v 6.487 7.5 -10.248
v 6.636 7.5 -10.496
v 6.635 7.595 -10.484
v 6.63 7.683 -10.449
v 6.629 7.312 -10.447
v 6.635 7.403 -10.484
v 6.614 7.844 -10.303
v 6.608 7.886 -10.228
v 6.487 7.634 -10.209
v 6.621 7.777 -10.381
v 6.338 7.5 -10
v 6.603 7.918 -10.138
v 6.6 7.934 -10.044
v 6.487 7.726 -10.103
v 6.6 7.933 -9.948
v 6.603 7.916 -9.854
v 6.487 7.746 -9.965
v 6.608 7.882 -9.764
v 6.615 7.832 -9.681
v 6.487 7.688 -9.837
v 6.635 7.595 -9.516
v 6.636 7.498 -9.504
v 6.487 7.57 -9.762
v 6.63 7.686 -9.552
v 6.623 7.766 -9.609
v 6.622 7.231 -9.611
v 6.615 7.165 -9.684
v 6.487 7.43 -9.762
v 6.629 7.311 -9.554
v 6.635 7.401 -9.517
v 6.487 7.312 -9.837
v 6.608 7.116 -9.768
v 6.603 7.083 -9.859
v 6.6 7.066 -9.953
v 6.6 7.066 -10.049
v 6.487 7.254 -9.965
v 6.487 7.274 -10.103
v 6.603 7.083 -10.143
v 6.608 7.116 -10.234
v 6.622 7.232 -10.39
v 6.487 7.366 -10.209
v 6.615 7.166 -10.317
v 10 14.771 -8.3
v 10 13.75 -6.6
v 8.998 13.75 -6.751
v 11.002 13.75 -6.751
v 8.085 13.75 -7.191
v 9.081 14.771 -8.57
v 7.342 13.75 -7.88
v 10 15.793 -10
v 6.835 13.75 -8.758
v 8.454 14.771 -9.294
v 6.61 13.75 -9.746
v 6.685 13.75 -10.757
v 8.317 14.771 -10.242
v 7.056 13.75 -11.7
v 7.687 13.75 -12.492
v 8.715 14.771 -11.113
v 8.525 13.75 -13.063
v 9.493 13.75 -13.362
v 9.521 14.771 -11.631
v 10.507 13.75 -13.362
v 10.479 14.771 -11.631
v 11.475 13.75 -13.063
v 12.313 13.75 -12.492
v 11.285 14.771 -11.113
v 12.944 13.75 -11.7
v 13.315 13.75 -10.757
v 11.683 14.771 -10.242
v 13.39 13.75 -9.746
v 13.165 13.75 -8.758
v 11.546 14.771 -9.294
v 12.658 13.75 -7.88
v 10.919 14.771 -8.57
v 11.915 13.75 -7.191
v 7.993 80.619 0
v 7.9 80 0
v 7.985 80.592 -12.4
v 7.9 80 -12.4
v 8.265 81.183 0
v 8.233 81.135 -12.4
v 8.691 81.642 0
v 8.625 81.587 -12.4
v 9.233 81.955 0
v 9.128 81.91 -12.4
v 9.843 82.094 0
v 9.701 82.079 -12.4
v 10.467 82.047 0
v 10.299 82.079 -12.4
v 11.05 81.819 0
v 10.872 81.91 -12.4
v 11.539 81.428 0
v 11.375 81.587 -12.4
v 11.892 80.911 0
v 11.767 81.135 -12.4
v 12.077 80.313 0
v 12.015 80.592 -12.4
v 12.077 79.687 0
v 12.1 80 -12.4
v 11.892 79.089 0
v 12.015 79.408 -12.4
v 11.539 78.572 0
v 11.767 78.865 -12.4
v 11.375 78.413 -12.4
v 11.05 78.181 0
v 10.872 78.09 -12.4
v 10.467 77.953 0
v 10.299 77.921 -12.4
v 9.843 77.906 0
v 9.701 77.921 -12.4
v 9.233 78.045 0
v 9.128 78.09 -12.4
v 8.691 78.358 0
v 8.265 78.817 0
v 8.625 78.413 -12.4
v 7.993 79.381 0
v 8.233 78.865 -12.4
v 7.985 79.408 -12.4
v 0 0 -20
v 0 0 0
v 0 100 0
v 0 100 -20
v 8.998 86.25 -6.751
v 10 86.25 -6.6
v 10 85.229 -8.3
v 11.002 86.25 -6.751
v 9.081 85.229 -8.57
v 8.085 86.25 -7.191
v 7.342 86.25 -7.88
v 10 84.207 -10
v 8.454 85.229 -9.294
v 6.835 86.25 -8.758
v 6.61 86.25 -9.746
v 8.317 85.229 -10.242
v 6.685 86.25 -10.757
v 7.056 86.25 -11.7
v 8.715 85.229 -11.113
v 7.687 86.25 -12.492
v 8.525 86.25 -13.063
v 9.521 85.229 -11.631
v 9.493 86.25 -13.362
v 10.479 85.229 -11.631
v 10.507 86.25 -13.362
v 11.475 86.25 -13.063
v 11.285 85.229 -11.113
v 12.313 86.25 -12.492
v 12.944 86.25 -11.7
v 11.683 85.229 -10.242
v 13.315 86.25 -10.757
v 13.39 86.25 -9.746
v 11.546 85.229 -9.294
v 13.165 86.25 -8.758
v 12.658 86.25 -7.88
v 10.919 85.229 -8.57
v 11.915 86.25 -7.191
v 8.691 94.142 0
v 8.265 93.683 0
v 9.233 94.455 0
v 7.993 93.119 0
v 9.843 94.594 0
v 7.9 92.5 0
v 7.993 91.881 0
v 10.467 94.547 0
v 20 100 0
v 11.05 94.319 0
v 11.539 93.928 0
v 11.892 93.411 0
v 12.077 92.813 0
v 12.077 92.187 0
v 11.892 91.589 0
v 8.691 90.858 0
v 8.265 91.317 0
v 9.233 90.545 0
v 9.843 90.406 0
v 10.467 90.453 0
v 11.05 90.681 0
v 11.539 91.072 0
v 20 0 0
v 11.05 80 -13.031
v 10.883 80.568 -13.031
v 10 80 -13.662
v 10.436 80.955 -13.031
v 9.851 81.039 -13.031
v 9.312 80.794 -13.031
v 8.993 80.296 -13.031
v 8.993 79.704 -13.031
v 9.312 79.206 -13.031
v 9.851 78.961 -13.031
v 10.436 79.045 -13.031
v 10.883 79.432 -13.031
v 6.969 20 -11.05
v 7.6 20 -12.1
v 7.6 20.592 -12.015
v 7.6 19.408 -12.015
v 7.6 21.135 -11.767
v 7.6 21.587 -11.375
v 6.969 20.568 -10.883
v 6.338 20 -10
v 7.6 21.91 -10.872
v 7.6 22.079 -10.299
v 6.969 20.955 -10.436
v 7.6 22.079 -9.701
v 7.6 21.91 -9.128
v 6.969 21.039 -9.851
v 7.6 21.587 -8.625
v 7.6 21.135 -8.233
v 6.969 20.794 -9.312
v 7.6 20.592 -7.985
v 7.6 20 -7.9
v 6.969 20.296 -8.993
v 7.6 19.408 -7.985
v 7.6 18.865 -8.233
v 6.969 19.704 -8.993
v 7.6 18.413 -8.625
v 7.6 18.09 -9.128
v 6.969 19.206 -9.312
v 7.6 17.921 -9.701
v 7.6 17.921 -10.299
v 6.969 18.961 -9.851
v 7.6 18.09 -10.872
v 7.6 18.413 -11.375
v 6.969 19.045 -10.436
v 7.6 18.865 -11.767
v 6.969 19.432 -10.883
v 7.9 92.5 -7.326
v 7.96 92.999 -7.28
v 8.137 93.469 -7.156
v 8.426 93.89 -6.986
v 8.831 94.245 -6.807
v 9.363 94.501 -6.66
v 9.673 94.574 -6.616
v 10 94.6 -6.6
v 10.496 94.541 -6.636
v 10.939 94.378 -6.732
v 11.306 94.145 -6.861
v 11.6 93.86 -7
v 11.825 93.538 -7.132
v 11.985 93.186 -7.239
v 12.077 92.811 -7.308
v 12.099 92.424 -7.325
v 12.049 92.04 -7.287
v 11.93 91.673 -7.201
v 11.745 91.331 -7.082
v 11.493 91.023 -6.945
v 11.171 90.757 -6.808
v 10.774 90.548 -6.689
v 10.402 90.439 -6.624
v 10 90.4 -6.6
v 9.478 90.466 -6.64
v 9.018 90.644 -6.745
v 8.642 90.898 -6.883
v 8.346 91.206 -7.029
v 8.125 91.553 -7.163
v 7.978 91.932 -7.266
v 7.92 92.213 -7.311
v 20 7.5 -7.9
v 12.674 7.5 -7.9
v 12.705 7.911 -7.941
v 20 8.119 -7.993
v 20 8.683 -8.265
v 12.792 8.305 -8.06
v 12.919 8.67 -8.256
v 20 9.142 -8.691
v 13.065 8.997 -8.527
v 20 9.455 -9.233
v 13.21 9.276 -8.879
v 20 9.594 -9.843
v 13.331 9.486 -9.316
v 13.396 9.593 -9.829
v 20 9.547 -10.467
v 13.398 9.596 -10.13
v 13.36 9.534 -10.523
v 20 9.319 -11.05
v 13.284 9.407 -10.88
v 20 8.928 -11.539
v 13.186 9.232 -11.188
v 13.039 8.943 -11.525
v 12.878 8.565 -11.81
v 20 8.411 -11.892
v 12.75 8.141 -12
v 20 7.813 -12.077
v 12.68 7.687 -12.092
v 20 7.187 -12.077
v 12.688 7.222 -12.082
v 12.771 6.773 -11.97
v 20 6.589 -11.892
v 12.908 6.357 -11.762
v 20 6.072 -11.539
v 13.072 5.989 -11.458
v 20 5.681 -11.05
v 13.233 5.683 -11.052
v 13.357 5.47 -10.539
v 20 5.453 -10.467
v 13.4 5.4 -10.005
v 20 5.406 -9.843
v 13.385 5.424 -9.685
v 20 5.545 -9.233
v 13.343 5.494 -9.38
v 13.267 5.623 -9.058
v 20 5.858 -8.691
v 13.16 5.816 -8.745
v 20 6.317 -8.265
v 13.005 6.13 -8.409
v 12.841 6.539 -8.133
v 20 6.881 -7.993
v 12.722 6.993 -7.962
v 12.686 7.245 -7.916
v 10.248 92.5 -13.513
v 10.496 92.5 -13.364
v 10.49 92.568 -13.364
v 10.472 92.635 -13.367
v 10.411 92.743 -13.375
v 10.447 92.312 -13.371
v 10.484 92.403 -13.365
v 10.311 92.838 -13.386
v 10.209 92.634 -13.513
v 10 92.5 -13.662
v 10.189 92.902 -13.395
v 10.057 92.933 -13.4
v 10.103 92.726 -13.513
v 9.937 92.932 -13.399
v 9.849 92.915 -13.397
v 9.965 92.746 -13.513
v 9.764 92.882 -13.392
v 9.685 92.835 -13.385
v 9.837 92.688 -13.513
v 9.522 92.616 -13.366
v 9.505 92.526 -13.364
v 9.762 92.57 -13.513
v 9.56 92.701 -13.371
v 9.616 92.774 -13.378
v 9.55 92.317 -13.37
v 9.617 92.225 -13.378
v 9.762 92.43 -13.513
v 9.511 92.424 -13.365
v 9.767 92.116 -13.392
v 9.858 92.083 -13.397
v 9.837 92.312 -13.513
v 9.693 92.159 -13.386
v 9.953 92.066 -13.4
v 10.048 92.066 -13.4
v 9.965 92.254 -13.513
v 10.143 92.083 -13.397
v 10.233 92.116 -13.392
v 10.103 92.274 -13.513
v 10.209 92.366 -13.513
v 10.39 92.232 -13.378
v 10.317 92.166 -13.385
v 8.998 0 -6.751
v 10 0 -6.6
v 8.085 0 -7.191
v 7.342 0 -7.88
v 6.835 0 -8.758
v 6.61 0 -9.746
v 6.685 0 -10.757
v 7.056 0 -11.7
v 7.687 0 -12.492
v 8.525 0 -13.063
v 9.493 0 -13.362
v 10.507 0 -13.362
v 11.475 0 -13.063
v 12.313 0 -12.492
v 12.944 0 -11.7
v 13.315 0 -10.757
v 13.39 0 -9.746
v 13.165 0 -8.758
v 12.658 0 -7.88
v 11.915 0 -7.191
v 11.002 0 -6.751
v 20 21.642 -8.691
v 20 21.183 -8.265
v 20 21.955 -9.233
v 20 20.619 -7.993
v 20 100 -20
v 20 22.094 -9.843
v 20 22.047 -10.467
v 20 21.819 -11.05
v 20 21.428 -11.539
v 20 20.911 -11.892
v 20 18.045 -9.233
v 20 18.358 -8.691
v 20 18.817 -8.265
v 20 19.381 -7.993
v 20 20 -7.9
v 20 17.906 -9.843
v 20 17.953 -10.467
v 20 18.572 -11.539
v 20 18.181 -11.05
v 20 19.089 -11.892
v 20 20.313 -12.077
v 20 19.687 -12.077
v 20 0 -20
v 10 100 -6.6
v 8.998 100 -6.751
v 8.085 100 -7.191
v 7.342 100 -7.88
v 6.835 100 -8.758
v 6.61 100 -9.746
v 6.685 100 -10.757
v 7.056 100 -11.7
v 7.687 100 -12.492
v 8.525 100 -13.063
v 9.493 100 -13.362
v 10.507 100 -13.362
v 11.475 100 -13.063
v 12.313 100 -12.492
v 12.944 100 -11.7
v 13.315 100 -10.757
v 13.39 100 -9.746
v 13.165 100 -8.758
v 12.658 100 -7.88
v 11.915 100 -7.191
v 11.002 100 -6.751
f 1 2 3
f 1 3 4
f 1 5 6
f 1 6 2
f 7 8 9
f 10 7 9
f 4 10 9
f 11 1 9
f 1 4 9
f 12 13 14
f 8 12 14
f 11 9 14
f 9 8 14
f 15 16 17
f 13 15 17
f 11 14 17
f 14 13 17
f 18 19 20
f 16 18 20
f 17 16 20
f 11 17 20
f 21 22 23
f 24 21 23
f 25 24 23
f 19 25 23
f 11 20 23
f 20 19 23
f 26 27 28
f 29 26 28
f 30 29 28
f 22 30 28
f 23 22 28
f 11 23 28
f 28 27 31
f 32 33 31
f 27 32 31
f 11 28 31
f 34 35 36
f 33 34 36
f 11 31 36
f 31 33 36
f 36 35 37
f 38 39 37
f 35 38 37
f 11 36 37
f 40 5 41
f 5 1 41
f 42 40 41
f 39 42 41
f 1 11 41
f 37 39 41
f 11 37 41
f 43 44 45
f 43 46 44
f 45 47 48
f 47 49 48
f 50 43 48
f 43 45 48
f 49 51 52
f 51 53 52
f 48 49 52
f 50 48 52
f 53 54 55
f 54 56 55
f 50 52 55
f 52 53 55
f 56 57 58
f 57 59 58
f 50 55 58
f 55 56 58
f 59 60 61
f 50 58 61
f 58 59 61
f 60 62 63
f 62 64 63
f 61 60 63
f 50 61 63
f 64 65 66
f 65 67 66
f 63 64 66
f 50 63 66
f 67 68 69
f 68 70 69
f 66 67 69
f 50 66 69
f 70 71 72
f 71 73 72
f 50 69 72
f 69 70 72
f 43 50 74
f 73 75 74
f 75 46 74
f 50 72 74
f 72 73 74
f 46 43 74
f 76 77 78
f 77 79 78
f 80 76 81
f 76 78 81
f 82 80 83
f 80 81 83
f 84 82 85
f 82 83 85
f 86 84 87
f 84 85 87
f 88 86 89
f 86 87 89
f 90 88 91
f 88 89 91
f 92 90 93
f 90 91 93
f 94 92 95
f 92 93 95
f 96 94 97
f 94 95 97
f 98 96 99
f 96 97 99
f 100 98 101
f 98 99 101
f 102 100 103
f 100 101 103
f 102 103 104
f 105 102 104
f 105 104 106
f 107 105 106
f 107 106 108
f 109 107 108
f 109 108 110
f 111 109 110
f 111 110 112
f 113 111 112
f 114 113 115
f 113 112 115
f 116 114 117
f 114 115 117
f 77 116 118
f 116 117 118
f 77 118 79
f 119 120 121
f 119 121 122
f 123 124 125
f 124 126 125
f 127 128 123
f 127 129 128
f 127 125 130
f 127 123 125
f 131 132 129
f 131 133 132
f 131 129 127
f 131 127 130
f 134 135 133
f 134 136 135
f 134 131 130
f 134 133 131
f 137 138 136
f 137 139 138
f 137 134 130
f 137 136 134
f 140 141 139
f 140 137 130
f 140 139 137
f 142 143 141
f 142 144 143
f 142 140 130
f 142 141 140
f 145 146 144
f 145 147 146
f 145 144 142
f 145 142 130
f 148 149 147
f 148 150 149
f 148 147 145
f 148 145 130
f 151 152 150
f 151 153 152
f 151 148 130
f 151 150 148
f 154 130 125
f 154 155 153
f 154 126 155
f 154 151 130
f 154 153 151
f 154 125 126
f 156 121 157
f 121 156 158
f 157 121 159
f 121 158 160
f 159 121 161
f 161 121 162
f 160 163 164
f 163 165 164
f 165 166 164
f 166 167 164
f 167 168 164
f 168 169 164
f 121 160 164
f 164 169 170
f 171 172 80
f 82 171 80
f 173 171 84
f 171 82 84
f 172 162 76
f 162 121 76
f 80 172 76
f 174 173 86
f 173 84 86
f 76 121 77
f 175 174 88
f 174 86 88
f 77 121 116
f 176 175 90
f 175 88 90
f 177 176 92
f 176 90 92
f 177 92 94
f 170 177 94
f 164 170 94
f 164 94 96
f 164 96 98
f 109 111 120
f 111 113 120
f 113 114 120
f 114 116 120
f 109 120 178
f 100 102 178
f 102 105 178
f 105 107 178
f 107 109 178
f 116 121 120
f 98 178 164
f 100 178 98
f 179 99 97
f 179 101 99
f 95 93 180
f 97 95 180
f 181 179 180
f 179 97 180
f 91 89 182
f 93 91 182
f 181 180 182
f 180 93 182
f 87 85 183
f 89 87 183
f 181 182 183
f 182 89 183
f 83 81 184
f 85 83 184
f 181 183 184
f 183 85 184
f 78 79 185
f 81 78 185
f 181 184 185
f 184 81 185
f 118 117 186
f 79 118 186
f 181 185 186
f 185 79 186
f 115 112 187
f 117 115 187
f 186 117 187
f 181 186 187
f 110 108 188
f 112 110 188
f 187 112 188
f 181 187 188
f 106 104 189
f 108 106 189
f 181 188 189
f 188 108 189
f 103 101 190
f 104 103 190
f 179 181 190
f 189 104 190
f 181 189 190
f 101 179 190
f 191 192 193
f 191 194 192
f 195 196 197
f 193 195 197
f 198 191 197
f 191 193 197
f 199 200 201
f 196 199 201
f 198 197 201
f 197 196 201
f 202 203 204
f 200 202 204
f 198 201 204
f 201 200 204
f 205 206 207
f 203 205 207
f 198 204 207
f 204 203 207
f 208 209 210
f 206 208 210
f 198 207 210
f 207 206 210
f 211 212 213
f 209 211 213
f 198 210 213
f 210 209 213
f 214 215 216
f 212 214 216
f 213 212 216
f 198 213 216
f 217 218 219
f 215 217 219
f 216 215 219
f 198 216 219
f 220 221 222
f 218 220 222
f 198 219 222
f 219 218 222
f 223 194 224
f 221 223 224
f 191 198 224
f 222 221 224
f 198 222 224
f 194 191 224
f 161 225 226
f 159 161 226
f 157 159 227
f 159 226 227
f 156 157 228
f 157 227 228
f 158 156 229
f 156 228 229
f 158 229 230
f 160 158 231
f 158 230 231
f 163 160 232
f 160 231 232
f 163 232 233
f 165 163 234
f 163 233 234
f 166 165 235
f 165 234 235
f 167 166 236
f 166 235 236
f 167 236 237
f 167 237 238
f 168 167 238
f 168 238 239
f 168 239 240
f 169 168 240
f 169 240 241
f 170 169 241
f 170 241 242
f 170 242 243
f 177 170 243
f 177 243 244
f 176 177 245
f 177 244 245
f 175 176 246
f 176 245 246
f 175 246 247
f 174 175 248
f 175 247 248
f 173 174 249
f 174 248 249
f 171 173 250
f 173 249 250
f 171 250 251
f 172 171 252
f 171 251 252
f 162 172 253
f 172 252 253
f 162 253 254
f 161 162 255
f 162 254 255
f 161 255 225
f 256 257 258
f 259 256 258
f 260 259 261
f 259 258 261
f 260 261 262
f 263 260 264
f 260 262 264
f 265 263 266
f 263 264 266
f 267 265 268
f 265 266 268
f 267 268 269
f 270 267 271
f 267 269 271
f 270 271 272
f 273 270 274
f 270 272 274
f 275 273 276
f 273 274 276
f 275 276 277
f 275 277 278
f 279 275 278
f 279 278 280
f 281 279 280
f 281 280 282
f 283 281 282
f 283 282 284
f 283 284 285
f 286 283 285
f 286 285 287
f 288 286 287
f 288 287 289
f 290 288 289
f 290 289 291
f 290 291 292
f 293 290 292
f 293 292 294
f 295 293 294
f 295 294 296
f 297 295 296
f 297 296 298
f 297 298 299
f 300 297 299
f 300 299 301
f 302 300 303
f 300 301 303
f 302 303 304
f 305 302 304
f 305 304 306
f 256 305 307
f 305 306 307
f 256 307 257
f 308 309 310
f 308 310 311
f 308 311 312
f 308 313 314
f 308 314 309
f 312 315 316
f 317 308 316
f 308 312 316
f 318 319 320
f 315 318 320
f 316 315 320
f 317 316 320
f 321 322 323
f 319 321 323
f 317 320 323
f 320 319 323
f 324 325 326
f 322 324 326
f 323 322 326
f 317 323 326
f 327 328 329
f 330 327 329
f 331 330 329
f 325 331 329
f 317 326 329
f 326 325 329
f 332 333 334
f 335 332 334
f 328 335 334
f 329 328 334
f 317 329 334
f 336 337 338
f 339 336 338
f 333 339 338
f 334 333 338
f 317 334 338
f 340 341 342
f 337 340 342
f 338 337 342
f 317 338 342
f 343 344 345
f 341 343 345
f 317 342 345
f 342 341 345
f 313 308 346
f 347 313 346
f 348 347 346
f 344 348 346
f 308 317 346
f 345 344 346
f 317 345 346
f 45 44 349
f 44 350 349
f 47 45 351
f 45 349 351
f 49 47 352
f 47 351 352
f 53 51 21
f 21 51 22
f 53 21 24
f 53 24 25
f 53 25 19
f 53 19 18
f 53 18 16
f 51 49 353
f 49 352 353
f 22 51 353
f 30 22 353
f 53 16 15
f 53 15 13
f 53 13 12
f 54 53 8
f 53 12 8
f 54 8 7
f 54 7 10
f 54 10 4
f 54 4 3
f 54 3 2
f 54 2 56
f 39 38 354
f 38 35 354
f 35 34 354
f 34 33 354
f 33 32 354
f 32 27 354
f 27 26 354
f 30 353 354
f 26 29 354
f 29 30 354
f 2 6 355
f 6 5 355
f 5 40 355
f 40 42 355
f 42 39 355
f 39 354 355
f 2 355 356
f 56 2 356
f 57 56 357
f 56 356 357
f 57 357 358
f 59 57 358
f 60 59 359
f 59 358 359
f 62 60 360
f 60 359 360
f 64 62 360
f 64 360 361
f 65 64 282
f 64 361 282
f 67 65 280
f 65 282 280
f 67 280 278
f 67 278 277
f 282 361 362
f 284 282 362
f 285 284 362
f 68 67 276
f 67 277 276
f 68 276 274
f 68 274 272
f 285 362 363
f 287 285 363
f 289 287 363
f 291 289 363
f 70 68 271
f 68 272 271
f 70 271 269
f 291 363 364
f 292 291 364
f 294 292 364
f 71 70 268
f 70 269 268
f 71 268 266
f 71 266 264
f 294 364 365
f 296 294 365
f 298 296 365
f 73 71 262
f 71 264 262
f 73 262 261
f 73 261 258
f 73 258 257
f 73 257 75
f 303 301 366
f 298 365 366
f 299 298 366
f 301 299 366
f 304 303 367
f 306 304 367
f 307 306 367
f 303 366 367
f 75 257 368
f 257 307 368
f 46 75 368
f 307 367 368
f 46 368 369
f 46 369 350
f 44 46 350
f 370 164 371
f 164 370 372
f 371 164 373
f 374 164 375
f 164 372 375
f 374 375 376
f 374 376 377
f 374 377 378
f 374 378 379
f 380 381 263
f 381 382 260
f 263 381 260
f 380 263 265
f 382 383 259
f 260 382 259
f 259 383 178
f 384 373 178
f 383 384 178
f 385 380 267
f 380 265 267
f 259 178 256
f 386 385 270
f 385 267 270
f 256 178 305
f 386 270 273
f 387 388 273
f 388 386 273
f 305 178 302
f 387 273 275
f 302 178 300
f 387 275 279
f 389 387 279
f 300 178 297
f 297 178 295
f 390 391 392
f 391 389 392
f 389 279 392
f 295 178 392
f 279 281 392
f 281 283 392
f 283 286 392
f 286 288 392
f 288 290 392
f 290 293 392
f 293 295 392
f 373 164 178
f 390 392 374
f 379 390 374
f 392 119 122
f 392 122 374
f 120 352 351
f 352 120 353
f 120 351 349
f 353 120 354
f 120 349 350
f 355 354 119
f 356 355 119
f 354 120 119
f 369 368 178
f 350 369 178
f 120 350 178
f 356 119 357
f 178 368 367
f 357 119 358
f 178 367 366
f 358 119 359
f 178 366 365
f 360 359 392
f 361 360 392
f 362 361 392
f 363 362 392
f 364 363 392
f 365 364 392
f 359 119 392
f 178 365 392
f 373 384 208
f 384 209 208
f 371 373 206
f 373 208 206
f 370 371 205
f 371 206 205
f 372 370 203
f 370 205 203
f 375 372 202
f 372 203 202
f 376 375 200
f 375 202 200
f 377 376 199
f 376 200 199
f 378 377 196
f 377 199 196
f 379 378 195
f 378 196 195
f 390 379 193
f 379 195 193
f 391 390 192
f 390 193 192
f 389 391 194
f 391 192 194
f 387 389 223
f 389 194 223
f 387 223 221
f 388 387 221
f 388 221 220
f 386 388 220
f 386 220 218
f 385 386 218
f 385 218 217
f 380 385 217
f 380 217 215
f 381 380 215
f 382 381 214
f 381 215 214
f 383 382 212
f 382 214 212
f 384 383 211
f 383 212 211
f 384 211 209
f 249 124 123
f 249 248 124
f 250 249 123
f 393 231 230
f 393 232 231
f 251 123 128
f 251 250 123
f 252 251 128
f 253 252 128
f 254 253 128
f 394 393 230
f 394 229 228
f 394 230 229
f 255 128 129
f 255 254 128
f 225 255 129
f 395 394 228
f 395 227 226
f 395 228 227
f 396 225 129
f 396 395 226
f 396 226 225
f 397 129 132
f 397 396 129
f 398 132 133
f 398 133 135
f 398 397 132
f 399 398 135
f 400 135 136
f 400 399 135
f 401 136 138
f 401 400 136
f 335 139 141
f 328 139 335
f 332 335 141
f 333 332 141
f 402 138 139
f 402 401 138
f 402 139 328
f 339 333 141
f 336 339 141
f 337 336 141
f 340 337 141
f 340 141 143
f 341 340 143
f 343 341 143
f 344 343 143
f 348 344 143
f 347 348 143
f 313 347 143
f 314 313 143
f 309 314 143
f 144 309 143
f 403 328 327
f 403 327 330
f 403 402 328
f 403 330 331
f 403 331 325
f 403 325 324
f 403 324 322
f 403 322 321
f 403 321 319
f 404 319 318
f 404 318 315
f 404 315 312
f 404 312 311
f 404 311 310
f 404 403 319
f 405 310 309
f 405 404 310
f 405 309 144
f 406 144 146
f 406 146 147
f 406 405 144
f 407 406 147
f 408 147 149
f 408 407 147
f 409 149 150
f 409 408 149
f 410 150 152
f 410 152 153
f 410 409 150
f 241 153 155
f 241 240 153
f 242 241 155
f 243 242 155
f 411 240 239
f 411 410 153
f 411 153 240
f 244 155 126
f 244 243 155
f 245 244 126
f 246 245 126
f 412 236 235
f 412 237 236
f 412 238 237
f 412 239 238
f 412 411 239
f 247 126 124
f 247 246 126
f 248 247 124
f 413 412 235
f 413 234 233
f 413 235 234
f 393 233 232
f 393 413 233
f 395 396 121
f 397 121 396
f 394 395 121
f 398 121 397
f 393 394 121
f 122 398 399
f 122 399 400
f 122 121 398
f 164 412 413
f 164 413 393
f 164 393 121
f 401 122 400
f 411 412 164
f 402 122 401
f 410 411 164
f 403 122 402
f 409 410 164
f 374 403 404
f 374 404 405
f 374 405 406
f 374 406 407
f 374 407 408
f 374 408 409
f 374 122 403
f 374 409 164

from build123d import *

# Parameters (mm, degrees)
SKETCH1_W             = 20
SKETCH1_H             = 20
BOSS_EXTRUDE1_DEPTH   = 100
M5_TAPPED_HOLE1_D     = 4.2
M5_TAPPED_HOLE1_DEPTH = 12.4
M5_TAPPED_HOLE1_TIP   = 1.2618073
M5_TAPPED_HOLE2_D     = 4.2
M5_TAPPED_HOLE2_DEPTH = 12.4
M5_TAPPED_HOLE2_TIP   = 1.2618073


with BuildPart() as part:
    # Sketch1 → Boss-Extrude1 (new body)
    with BuildSketch(Plane(origin=(0, 0, 0), x_dir=(1, 0, 0), z_dir=(0, 1, 0))):
        with Locations((10, 10)):
            Rectangle(SKETCH1_W, SKETCH1_H)
    extrude(amount=BOSS_EXTRUDE1_DEPTH)

    # Sketch5 → M8 Tapped Hole1 (revolve, cut)
    with BuildSketch(Plane(origin=(10, 100, -10), x_dir=(0, 0, 1), z_dir=(1, 0, 0))):
        Polygon((0, 0), (0, 15.792926105), (3.4, 13.75), (3.4, 0), align=None)
    m8_tapped_hole1 = revolve(axis=Axis((10, 106.35, -10), (0, -1, 0)), mode=Mode.SUBTRACT)

    # Mirror1: M8 Tapped Hole1 across plane
    add(m8_tapped_hole1.mirror(Plane.ZX.offset(50)), mode=Mode.SUBTRACT)

    # M5 Tapped Hole1
    with Locations(Plane.XY):
        with Locations((10, 80), (10, 92.5)):
            Hole(M5_TAPPED_HOLE1_D / 2, depth=M5_TAPPED_HOLE1_DEPTH)
            with Locations((0, 0, -(M5_TAPPED_HOLE1_DEPTH + M5_TAPPED_HOLE1_TIP / 2))):  # 118° drill point
                Cone(0, M5_TAPPED_HOLE1_D / 2, M5_TAPPED_HOLE1_TIP, mode=Mode.SUBTRACT)

    # M5 Tapped Hole2
    with Locations(Plane(origin=(20, 0, 0), x_dir=(0, 0, -1), z_dir=(1, 0, 0))):
        with Locations((10, 7.5), (10, 20)):
            Hole(M5_TAPPED_HOLE2_D / 2, depth=M5_TAPPED_HOLE2_DEPTH)
            with Locations((0, 0, -(M5_TAPPED_HOLE2_DEPTH + M5_TAPPED_HOLE2_TIP / 2))):  # 118° drill point
                Cone(0, M5_TAPPED_HOLE2_D / 2, M5_TAPPED_HOLE2_TIP, mode=Mode.SUBTRACT)


solid = part.part
